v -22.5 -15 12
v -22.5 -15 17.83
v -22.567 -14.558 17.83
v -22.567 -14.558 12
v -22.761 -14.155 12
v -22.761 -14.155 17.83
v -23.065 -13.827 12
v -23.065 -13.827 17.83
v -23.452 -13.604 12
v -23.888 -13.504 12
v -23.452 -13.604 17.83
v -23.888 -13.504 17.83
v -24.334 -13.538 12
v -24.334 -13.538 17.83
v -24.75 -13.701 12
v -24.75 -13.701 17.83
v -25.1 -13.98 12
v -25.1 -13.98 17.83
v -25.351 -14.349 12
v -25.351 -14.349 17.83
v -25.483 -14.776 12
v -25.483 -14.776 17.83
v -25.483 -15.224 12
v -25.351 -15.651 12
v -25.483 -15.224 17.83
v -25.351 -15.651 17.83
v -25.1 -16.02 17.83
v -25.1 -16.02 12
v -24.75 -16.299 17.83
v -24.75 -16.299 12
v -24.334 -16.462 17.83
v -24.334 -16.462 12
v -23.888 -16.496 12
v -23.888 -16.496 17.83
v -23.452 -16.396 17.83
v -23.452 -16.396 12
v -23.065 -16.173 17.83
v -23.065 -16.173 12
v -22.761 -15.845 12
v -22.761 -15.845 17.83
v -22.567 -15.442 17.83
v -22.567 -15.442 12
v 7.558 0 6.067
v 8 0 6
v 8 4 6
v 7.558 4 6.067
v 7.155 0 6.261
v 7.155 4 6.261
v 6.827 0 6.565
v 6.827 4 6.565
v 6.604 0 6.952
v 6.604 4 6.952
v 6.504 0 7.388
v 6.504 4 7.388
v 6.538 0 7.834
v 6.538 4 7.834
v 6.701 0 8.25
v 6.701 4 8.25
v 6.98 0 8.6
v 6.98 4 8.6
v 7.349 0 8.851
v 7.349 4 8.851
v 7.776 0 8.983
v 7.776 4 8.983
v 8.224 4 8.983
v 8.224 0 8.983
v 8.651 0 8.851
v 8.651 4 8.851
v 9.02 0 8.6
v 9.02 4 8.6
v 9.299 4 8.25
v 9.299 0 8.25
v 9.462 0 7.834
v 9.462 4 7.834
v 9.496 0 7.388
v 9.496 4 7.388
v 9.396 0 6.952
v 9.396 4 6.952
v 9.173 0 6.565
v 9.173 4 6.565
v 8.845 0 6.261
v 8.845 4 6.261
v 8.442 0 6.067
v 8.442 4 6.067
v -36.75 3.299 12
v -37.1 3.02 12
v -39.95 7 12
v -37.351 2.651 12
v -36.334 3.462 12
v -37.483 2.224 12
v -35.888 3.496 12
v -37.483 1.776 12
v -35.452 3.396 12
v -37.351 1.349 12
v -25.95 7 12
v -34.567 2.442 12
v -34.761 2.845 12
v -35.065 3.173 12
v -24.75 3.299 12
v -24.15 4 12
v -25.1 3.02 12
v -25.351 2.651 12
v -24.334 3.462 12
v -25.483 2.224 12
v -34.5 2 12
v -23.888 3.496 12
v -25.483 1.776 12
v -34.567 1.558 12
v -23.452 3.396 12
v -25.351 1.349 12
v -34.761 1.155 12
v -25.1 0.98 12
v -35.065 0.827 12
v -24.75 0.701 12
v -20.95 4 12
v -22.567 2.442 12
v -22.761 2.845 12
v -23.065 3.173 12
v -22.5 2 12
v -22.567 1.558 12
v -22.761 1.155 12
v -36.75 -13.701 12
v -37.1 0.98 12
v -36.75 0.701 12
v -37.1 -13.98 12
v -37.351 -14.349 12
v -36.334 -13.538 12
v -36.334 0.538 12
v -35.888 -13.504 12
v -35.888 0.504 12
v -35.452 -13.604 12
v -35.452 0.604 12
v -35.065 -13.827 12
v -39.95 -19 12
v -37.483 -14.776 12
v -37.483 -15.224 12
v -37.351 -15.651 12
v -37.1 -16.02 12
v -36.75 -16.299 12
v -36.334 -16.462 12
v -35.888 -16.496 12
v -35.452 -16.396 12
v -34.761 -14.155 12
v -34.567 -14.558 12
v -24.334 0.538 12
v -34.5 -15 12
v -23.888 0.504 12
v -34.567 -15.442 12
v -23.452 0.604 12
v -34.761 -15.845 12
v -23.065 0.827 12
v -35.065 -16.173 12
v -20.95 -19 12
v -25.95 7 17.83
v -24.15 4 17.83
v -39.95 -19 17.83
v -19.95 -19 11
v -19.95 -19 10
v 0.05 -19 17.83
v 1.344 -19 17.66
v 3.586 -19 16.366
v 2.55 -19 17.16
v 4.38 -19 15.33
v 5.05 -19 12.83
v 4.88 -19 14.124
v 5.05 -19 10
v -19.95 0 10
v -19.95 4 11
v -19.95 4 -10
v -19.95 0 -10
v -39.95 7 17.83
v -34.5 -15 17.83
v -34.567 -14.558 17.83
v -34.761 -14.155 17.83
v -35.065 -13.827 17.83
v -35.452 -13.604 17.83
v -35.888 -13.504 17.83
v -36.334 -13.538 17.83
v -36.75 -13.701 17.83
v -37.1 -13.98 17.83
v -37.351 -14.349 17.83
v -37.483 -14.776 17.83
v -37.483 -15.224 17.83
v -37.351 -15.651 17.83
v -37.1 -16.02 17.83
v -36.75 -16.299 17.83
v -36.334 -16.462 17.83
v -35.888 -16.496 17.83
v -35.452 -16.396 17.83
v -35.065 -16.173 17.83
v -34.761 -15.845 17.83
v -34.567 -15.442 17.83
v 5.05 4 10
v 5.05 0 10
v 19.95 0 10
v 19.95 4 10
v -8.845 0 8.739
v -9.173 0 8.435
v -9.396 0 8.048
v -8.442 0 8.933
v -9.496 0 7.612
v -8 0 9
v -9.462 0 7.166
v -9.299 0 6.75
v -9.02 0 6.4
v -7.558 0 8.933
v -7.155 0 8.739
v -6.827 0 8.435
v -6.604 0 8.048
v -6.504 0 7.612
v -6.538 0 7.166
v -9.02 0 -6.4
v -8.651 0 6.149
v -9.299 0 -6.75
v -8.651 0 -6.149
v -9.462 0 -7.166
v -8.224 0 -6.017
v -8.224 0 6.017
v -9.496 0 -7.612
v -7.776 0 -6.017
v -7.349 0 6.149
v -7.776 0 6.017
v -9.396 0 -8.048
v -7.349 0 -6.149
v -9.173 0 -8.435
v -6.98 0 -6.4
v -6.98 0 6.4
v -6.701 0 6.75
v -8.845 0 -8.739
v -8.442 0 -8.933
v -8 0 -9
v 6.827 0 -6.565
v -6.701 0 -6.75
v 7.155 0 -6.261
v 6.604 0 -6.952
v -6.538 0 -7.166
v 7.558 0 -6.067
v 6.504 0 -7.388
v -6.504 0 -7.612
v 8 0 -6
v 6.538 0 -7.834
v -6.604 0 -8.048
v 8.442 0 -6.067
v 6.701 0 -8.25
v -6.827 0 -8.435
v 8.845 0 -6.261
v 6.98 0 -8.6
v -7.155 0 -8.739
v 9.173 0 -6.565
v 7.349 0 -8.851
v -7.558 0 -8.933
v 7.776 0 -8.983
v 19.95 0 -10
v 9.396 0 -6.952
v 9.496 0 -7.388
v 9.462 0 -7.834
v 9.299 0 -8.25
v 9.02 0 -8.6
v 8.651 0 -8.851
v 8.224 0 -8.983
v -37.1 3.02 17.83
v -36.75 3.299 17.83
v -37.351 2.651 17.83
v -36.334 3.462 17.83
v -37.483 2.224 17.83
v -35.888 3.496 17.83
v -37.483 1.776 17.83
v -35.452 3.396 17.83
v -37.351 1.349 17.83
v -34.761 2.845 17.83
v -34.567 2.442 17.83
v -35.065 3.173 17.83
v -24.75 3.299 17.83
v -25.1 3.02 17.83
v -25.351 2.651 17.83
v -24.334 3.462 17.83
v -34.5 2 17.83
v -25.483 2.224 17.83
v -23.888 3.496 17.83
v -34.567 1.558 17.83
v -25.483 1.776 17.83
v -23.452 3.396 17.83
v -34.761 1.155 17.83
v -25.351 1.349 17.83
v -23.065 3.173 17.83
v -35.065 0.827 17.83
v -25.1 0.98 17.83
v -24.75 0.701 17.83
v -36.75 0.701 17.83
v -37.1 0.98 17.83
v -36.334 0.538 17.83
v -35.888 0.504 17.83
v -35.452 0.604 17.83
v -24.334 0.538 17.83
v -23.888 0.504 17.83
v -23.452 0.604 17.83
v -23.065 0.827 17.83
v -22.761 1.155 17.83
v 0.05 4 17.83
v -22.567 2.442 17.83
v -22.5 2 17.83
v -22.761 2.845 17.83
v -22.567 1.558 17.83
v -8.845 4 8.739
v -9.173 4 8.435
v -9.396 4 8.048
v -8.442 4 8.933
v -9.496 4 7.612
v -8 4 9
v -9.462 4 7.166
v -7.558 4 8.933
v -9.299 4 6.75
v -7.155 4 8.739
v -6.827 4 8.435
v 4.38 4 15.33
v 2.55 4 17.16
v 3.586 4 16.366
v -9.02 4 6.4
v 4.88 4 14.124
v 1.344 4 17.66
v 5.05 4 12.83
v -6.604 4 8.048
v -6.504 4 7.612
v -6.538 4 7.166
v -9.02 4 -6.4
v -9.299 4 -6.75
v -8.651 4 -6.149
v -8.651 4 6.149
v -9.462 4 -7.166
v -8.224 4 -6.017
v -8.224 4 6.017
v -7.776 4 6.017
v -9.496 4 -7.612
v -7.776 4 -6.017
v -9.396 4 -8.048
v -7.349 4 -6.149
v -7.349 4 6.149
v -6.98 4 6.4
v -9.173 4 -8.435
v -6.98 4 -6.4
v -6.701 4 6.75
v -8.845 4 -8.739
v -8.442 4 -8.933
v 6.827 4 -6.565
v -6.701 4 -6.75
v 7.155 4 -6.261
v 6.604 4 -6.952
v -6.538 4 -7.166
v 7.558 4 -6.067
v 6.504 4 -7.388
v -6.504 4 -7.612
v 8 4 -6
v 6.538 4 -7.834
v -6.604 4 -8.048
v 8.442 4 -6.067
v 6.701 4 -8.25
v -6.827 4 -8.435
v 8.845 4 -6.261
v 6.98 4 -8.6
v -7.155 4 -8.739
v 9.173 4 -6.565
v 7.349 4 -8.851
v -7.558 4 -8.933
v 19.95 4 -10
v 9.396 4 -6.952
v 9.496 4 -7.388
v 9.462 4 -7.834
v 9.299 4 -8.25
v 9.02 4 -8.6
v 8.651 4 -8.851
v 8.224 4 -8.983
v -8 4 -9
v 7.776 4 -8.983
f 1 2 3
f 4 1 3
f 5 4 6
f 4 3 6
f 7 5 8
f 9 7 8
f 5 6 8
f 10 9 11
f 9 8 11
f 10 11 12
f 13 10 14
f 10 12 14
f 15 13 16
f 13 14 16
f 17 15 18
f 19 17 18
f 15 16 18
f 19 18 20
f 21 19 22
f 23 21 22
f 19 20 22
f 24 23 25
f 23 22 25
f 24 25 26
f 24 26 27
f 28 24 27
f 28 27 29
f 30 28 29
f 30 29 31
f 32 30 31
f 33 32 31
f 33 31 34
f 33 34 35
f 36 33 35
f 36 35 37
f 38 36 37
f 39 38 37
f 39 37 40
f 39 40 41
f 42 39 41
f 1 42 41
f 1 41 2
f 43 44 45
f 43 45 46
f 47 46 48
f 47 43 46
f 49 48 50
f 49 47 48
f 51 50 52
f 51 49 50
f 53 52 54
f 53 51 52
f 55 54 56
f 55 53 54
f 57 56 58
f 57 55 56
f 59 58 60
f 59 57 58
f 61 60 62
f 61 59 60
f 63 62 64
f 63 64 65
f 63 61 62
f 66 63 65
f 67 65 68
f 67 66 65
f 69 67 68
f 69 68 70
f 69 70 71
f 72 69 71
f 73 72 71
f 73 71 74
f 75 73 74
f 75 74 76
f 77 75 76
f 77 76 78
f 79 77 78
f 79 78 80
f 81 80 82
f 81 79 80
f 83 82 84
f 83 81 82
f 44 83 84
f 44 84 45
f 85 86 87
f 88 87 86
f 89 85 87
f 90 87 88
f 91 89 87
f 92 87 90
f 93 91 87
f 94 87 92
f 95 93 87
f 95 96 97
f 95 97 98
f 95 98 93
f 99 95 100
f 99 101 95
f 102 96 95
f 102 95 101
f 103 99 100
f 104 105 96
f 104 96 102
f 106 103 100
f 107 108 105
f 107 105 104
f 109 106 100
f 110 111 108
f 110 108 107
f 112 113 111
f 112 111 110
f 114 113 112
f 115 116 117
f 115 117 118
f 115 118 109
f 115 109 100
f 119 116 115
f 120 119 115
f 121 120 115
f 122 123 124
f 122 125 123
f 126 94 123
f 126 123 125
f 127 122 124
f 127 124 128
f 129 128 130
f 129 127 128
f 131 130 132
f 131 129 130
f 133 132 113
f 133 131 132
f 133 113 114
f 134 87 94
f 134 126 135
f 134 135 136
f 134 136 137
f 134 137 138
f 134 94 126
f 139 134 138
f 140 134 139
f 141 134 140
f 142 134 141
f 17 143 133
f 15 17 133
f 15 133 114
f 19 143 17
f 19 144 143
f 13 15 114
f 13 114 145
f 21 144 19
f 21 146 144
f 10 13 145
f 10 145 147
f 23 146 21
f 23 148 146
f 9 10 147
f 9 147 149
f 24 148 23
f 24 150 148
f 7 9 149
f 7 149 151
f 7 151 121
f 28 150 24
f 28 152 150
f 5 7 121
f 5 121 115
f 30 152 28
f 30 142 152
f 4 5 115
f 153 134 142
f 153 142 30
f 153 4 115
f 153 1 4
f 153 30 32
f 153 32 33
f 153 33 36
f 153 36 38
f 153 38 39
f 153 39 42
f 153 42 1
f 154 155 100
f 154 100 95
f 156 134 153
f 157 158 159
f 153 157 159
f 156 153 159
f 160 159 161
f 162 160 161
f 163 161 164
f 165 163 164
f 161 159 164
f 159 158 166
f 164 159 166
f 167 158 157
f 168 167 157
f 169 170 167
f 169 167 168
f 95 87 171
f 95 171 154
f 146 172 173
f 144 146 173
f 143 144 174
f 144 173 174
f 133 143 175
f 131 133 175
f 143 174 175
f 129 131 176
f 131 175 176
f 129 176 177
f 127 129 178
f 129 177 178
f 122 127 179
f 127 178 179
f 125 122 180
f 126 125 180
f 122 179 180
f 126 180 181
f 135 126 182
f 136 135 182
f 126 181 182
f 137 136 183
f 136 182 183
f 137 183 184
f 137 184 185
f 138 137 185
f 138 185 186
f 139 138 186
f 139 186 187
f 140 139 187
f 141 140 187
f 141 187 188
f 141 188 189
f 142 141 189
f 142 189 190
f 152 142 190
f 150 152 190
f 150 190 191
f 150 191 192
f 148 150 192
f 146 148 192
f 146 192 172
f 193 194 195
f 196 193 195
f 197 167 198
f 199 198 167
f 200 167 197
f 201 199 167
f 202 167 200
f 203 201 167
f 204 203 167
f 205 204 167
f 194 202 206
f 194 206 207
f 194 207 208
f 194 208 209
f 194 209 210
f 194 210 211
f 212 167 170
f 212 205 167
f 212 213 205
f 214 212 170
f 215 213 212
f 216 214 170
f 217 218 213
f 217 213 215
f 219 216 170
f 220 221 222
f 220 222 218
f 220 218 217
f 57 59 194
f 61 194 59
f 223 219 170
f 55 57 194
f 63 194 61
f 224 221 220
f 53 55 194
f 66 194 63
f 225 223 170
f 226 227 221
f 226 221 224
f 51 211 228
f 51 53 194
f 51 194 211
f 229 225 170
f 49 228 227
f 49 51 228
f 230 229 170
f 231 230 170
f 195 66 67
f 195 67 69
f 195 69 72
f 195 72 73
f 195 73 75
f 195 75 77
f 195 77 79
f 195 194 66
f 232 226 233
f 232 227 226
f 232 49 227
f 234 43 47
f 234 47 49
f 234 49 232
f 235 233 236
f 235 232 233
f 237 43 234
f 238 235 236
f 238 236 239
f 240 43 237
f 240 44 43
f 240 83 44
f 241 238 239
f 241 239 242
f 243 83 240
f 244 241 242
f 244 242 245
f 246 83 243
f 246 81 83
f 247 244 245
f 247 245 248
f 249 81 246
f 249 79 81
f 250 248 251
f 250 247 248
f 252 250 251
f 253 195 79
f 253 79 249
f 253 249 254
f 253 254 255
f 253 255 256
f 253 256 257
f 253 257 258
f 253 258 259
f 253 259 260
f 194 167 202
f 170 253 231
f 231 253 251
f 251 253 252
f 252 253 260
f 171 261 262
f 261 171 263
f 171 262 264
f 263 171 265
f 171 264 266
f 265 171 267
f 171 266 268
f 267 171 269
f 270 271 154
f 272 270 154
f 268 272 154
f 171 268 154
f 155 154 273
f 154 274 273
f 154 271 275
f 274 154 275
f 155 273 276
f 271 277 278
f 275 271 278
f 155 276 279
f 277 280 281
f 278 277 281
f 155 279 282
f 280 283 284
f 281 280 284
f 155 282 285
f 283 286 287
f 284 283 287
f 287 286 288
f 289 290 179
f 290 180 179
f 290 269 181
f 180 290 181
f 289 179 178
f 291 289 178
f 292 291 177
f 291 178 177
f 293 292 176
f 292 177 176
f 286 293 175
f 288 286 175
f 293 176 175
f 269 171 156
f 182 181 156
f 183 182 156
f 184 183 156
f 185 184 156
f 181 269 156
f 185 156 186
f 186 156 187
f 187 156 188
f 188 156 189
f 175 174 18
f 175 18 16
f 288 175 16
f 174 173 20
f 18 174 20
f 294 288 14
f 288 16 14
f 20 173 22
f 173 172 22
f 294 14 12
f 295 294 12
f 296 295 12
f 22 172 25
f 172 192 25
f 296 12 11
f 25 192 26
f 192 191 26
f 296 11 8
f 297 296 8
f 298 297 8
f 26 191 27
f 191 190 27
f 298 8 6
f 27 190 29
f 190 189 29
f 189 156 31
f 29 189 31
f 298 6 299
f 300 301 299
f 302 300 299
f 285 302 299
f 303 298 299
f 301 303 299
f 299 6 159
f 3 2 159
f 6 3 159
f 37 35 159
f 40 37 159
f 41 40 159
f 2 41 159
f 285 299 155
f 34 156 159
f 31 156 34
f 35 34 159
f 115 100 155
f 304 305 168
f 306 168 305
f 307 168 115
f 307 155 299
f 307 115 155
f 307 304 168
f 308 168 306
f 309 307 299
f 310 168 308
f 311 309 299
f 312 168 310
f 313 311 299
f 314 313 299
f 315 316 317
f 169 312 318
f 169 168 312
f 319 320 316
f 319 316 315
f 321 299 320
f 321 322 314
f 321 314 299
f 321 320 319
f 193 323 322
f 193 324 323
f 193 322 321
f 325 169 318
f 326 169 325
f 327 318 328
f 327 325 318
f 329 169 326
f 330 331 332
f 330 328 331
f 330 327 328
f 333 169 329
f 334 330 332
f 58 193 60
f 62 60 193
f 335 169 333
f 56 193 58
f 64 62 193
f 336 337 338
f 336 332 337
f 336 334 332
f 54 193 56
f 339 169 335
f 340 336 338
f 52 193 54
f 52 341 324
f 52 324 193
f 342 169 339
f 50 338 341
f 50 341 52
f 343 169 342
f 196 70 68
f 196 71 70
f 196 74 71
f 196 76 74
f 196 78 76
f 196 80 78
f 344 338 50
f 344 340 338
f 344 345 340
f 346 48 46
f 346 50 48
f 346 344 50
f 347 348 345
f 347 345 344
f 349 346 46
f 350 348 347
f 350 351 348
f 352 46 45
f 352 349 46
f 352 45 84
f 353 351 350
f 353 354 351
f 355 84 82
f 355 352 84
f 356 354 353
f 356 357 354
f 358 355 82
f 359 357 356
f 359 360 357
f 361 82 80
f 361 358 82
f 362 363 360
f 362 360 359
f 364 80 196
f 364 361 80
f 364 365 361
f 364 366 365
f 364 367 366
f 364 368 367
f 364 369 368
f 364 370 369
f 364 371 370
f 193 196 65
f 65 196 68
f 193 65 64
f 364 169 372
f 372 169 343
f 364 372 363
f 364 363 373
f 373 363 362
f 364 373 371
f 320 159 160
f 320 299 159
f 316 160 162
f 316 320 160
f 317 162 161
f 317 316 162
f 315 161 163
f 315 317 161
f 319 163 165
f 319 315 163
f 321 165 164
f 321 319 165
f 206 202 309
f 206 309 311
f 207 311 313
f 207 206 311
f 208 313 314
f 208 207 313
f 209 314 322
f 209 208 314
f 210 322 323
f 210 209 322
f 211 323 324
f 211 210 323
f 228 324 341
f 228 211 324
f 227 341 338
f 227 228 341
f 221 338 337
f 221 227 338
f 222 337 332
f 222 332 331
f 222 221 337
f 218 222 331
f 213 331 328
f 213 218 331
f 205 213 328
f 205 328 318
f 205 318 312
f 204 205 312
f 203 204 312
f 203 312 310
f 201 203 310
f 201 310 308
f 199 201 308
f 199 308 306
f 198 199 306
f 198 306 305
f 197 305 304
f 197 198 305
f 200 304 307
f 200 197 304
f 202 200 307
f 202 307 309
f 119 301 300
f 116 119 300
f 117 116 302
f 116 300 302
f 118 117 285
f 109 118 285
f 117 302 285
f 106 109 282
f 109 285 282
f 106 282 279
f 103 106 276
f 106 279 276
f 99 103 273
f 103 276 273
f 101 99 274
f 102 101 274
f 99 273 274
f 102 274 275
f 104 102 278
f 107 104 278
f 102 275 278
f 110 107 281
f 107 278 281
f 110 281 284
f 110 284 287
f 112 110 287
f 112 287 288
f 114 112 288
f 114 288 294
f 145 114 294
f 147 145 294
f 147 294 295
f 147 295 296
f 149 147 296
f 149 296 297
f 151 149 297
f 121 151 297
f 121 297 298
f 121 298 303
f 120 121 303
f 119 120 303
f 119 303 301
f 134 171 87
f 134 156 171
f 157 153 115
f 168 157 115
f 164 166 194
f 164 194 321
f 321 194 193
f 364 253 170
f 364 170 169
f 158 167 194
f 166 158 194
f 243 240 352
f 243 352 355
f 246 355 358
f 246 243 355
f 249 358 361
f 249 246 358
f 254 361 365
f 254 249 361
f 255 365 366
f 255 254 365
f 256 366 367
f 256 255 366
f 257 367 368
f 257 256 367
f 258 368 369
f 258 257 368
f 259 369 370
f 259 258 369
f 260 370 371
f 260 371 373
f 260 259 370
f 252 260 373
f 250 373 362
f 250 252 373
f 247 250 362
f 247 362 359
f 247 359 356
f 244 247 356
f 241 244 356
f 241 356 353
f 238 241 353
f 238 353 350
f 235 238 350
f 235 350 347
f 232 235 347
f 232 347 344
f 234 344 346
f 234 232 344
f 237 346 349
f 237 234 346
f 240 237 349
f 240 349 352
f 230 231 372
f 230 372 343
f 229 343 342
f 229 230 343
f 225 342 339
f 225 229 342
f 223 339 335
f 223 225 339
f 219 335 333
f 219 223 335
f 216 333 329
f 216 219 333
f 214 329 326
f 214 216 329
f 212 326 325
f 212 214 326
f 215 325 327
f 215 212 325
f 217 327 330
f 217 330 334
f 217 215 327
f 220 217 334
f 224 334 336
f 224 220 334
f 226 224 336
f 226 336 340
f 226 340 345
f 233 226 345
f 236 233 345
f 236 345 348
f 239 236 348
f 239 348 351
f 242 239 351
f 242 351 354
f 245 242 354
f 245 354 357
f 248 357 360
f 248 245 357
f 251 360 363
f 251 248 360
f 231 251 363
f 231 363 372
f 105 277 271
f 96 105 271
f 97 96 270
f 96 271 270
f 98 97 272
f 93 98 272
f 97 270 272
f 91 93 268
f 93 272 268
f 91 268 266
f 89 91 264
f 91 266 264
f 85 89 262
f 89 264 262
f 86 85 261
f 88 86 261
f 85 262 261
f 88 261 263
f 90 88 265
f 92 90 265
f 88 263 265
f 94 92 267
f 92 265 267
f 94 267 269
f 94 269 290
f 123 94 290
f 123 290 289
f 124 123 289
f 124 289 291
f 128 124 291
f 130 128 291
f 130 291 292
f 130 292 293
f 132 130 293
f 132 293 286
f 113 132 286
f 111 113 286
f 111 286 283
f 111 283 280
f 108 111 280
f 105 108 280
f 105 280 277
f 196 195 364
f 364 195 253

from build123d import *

# Parameters (mm, degrees)
SKETCH_1_W          = 39.9
SKETCH_1_H          = 20
SKETCH_1_R          = 1.5
EXTRUDE_1_DEPTH     = 4
EXTRUDE_4_DEPTH     = 20
SKETCH_7_R          = 1.5
CUT_EXTRUDE_3_DEPTH = 15
SKETCH_8_W          = 25
SKETCH_8_H          = 23
EXTRUDE_5_DEPTH     = 7.83
SKETCH_9_W          = 20
SKETCH_9_H          = 4
CUT_EXTRUDE_4_DEPTH = 20
FILLET_1_R          = 5
SKETCH_12_W         = 20
SKETCH_12_H         = 23
CUT_EXTRUDE_5_DEPTH = 2
SKETCH_14_W         = 20
SKETCH_14_H         = 5.83
EXTRUDE_6_DEPTH     = 3
CHAMFER_1_SIZE      = 1
CUT_EXTRUDE_6_DEPTH = 10


with BuildPart() as part:
    # 草图1 → 凸台-拉伸1 (new body)
    with BuildSketch(Plane(origin=(0, 0, 0), x_dir=(1, 0, 0), z_dir=(0, 1, 0))):
        Rectangle(SKETCH_1_W, SKETCH_1_H)
        with Locations(Location((8, 7.5, 0), (0, 0, 270))):
            Circle(SKETCH_1_R, mode=Mode.SUBTRACT)
        with Locations(Location((8, -7.5, 0), (0, 0, 90))):
            Circle(SKETCH_1_R, mode=Mode.SUBTRACT)
        with Locations(Location((-8, -7.5, 0), (0, 0, 270))):
            Circle(SKETCH_1_R, mode=Mode.SUBTRACT)
        with Locations(Location((-8, 7.5, 0), (0, 0, 90))):
            Circle(SKETCH_1_R, mode=Mode.SUBTRACT)
    extrude(amount=EXTRUDE_1_DEPTH)

    # 草图6 → 凸台-拉伸4 (add)
    with BuildSketch(Plane.ZY.offset(19.95)):
        Polygon((-10, 4), (10, 4), (17.83, 4), (17.83, -19), (10, -19), (10, 0), (-10, 0), align=None)
    extrude(amount=EXTRUDE_4_DEPTH)

    # 草图7 → 切除-拉伸3 (cut)
    with BuildSketch(Plane.XY.offset(17.83)):
        with Locations((-36, 2)):
            Circle(SKETCH_7_R)
        with Locations((-24, 2)):
            Circle(SKETCH_7_R)
        with Locations((-36, -15)):
            Circle(SKETCH_7_R)
        with Locations((-24, -15)):
            Circle(SKETCH_7_R)
    extrude(amount=-CUT_EXTRUDE_3_DEPTH, mode=Mode.SUBTRACT)

    # 草图8 → 凸台-拉伸5 (add)
    with BuildSketch(Plane.XY.offset(10)):
        with Locations((-7.45, -7.5)):
            Rectangle(SKETCH_8_W, SKETCH_8_H)
    extrude(amount=EXTRUDE_5_DEPTH)

    # 草图9 → 切除-拉伸4 (cut)
    with BuildSketch(Plane(origin=(0, 0, -10), x_dir=(-1, 0, 0), z_dir=(0, 0, -1))):
        with Locations((29.95, 2)):
            Rectangle(SKETCH_9_W, SKETCH_9_H)
    extrude(amount=-CUT_EXTRUDE_4_DEPTH, mode=Mode.SUBTRACT)

    # 圆角1
    fillet_1_edges = [part.edges().sort_by_distance(p)[0] for p in [
        (5.05, -7.5, 17.83),
    ]]
    fillet(fillet_1_edges, radius=FILLET_1_R)

    # 草图12 → 切除-拉伸5 (cut)
    with BuildSketch(Plane(origin=(0, 0, 10), x_dir=(-1, 0, 0), z_dir=(0, 0, -1))):
        with Locations((29.95, -7.5)):
            Rectangle(SKETCH_12_W, SKETCH_12_H)
    extrude(amount=-CUT_EXTRUDE_5_DEPTH, mode=Mode.SUBTRACT)

    # 草图14 → 凸台-拉伸6 (add)
    with BuildSketch(Plane(origin=(0, 4, 0), x_dir=(1, 0, 0), z_dir=(0, 1, 0))):
        with Locations((-29.95, -14.915)):
            Rectangle(SKETCH_14_W, SKETCH_14_H)
    extrude(amount=EXTRUDE_6_DEPTH)

    # 倒角1
    chamfer_1_edges = [part.edges().sort_by_distance(p)[0] for p in [
        (-19.95, -7.5, 12),
    ]]
    chamfer(chamfer_1_edges, length=CHAMFER_1_SIZE)

    # 草图16 → 切除-拉伸6 (cut)
    with BuildSketch(Plane.XY.offset(17.83)):
        Polygon((-19.95, 4), (-24.15, 4), (-25.95, 7), (-19.95, 7), align=None)
    extrude(amount=-CUT_EXTRUDE_6_DEPTH, mode=Mode.SUBTRACT)


solid = part.part
